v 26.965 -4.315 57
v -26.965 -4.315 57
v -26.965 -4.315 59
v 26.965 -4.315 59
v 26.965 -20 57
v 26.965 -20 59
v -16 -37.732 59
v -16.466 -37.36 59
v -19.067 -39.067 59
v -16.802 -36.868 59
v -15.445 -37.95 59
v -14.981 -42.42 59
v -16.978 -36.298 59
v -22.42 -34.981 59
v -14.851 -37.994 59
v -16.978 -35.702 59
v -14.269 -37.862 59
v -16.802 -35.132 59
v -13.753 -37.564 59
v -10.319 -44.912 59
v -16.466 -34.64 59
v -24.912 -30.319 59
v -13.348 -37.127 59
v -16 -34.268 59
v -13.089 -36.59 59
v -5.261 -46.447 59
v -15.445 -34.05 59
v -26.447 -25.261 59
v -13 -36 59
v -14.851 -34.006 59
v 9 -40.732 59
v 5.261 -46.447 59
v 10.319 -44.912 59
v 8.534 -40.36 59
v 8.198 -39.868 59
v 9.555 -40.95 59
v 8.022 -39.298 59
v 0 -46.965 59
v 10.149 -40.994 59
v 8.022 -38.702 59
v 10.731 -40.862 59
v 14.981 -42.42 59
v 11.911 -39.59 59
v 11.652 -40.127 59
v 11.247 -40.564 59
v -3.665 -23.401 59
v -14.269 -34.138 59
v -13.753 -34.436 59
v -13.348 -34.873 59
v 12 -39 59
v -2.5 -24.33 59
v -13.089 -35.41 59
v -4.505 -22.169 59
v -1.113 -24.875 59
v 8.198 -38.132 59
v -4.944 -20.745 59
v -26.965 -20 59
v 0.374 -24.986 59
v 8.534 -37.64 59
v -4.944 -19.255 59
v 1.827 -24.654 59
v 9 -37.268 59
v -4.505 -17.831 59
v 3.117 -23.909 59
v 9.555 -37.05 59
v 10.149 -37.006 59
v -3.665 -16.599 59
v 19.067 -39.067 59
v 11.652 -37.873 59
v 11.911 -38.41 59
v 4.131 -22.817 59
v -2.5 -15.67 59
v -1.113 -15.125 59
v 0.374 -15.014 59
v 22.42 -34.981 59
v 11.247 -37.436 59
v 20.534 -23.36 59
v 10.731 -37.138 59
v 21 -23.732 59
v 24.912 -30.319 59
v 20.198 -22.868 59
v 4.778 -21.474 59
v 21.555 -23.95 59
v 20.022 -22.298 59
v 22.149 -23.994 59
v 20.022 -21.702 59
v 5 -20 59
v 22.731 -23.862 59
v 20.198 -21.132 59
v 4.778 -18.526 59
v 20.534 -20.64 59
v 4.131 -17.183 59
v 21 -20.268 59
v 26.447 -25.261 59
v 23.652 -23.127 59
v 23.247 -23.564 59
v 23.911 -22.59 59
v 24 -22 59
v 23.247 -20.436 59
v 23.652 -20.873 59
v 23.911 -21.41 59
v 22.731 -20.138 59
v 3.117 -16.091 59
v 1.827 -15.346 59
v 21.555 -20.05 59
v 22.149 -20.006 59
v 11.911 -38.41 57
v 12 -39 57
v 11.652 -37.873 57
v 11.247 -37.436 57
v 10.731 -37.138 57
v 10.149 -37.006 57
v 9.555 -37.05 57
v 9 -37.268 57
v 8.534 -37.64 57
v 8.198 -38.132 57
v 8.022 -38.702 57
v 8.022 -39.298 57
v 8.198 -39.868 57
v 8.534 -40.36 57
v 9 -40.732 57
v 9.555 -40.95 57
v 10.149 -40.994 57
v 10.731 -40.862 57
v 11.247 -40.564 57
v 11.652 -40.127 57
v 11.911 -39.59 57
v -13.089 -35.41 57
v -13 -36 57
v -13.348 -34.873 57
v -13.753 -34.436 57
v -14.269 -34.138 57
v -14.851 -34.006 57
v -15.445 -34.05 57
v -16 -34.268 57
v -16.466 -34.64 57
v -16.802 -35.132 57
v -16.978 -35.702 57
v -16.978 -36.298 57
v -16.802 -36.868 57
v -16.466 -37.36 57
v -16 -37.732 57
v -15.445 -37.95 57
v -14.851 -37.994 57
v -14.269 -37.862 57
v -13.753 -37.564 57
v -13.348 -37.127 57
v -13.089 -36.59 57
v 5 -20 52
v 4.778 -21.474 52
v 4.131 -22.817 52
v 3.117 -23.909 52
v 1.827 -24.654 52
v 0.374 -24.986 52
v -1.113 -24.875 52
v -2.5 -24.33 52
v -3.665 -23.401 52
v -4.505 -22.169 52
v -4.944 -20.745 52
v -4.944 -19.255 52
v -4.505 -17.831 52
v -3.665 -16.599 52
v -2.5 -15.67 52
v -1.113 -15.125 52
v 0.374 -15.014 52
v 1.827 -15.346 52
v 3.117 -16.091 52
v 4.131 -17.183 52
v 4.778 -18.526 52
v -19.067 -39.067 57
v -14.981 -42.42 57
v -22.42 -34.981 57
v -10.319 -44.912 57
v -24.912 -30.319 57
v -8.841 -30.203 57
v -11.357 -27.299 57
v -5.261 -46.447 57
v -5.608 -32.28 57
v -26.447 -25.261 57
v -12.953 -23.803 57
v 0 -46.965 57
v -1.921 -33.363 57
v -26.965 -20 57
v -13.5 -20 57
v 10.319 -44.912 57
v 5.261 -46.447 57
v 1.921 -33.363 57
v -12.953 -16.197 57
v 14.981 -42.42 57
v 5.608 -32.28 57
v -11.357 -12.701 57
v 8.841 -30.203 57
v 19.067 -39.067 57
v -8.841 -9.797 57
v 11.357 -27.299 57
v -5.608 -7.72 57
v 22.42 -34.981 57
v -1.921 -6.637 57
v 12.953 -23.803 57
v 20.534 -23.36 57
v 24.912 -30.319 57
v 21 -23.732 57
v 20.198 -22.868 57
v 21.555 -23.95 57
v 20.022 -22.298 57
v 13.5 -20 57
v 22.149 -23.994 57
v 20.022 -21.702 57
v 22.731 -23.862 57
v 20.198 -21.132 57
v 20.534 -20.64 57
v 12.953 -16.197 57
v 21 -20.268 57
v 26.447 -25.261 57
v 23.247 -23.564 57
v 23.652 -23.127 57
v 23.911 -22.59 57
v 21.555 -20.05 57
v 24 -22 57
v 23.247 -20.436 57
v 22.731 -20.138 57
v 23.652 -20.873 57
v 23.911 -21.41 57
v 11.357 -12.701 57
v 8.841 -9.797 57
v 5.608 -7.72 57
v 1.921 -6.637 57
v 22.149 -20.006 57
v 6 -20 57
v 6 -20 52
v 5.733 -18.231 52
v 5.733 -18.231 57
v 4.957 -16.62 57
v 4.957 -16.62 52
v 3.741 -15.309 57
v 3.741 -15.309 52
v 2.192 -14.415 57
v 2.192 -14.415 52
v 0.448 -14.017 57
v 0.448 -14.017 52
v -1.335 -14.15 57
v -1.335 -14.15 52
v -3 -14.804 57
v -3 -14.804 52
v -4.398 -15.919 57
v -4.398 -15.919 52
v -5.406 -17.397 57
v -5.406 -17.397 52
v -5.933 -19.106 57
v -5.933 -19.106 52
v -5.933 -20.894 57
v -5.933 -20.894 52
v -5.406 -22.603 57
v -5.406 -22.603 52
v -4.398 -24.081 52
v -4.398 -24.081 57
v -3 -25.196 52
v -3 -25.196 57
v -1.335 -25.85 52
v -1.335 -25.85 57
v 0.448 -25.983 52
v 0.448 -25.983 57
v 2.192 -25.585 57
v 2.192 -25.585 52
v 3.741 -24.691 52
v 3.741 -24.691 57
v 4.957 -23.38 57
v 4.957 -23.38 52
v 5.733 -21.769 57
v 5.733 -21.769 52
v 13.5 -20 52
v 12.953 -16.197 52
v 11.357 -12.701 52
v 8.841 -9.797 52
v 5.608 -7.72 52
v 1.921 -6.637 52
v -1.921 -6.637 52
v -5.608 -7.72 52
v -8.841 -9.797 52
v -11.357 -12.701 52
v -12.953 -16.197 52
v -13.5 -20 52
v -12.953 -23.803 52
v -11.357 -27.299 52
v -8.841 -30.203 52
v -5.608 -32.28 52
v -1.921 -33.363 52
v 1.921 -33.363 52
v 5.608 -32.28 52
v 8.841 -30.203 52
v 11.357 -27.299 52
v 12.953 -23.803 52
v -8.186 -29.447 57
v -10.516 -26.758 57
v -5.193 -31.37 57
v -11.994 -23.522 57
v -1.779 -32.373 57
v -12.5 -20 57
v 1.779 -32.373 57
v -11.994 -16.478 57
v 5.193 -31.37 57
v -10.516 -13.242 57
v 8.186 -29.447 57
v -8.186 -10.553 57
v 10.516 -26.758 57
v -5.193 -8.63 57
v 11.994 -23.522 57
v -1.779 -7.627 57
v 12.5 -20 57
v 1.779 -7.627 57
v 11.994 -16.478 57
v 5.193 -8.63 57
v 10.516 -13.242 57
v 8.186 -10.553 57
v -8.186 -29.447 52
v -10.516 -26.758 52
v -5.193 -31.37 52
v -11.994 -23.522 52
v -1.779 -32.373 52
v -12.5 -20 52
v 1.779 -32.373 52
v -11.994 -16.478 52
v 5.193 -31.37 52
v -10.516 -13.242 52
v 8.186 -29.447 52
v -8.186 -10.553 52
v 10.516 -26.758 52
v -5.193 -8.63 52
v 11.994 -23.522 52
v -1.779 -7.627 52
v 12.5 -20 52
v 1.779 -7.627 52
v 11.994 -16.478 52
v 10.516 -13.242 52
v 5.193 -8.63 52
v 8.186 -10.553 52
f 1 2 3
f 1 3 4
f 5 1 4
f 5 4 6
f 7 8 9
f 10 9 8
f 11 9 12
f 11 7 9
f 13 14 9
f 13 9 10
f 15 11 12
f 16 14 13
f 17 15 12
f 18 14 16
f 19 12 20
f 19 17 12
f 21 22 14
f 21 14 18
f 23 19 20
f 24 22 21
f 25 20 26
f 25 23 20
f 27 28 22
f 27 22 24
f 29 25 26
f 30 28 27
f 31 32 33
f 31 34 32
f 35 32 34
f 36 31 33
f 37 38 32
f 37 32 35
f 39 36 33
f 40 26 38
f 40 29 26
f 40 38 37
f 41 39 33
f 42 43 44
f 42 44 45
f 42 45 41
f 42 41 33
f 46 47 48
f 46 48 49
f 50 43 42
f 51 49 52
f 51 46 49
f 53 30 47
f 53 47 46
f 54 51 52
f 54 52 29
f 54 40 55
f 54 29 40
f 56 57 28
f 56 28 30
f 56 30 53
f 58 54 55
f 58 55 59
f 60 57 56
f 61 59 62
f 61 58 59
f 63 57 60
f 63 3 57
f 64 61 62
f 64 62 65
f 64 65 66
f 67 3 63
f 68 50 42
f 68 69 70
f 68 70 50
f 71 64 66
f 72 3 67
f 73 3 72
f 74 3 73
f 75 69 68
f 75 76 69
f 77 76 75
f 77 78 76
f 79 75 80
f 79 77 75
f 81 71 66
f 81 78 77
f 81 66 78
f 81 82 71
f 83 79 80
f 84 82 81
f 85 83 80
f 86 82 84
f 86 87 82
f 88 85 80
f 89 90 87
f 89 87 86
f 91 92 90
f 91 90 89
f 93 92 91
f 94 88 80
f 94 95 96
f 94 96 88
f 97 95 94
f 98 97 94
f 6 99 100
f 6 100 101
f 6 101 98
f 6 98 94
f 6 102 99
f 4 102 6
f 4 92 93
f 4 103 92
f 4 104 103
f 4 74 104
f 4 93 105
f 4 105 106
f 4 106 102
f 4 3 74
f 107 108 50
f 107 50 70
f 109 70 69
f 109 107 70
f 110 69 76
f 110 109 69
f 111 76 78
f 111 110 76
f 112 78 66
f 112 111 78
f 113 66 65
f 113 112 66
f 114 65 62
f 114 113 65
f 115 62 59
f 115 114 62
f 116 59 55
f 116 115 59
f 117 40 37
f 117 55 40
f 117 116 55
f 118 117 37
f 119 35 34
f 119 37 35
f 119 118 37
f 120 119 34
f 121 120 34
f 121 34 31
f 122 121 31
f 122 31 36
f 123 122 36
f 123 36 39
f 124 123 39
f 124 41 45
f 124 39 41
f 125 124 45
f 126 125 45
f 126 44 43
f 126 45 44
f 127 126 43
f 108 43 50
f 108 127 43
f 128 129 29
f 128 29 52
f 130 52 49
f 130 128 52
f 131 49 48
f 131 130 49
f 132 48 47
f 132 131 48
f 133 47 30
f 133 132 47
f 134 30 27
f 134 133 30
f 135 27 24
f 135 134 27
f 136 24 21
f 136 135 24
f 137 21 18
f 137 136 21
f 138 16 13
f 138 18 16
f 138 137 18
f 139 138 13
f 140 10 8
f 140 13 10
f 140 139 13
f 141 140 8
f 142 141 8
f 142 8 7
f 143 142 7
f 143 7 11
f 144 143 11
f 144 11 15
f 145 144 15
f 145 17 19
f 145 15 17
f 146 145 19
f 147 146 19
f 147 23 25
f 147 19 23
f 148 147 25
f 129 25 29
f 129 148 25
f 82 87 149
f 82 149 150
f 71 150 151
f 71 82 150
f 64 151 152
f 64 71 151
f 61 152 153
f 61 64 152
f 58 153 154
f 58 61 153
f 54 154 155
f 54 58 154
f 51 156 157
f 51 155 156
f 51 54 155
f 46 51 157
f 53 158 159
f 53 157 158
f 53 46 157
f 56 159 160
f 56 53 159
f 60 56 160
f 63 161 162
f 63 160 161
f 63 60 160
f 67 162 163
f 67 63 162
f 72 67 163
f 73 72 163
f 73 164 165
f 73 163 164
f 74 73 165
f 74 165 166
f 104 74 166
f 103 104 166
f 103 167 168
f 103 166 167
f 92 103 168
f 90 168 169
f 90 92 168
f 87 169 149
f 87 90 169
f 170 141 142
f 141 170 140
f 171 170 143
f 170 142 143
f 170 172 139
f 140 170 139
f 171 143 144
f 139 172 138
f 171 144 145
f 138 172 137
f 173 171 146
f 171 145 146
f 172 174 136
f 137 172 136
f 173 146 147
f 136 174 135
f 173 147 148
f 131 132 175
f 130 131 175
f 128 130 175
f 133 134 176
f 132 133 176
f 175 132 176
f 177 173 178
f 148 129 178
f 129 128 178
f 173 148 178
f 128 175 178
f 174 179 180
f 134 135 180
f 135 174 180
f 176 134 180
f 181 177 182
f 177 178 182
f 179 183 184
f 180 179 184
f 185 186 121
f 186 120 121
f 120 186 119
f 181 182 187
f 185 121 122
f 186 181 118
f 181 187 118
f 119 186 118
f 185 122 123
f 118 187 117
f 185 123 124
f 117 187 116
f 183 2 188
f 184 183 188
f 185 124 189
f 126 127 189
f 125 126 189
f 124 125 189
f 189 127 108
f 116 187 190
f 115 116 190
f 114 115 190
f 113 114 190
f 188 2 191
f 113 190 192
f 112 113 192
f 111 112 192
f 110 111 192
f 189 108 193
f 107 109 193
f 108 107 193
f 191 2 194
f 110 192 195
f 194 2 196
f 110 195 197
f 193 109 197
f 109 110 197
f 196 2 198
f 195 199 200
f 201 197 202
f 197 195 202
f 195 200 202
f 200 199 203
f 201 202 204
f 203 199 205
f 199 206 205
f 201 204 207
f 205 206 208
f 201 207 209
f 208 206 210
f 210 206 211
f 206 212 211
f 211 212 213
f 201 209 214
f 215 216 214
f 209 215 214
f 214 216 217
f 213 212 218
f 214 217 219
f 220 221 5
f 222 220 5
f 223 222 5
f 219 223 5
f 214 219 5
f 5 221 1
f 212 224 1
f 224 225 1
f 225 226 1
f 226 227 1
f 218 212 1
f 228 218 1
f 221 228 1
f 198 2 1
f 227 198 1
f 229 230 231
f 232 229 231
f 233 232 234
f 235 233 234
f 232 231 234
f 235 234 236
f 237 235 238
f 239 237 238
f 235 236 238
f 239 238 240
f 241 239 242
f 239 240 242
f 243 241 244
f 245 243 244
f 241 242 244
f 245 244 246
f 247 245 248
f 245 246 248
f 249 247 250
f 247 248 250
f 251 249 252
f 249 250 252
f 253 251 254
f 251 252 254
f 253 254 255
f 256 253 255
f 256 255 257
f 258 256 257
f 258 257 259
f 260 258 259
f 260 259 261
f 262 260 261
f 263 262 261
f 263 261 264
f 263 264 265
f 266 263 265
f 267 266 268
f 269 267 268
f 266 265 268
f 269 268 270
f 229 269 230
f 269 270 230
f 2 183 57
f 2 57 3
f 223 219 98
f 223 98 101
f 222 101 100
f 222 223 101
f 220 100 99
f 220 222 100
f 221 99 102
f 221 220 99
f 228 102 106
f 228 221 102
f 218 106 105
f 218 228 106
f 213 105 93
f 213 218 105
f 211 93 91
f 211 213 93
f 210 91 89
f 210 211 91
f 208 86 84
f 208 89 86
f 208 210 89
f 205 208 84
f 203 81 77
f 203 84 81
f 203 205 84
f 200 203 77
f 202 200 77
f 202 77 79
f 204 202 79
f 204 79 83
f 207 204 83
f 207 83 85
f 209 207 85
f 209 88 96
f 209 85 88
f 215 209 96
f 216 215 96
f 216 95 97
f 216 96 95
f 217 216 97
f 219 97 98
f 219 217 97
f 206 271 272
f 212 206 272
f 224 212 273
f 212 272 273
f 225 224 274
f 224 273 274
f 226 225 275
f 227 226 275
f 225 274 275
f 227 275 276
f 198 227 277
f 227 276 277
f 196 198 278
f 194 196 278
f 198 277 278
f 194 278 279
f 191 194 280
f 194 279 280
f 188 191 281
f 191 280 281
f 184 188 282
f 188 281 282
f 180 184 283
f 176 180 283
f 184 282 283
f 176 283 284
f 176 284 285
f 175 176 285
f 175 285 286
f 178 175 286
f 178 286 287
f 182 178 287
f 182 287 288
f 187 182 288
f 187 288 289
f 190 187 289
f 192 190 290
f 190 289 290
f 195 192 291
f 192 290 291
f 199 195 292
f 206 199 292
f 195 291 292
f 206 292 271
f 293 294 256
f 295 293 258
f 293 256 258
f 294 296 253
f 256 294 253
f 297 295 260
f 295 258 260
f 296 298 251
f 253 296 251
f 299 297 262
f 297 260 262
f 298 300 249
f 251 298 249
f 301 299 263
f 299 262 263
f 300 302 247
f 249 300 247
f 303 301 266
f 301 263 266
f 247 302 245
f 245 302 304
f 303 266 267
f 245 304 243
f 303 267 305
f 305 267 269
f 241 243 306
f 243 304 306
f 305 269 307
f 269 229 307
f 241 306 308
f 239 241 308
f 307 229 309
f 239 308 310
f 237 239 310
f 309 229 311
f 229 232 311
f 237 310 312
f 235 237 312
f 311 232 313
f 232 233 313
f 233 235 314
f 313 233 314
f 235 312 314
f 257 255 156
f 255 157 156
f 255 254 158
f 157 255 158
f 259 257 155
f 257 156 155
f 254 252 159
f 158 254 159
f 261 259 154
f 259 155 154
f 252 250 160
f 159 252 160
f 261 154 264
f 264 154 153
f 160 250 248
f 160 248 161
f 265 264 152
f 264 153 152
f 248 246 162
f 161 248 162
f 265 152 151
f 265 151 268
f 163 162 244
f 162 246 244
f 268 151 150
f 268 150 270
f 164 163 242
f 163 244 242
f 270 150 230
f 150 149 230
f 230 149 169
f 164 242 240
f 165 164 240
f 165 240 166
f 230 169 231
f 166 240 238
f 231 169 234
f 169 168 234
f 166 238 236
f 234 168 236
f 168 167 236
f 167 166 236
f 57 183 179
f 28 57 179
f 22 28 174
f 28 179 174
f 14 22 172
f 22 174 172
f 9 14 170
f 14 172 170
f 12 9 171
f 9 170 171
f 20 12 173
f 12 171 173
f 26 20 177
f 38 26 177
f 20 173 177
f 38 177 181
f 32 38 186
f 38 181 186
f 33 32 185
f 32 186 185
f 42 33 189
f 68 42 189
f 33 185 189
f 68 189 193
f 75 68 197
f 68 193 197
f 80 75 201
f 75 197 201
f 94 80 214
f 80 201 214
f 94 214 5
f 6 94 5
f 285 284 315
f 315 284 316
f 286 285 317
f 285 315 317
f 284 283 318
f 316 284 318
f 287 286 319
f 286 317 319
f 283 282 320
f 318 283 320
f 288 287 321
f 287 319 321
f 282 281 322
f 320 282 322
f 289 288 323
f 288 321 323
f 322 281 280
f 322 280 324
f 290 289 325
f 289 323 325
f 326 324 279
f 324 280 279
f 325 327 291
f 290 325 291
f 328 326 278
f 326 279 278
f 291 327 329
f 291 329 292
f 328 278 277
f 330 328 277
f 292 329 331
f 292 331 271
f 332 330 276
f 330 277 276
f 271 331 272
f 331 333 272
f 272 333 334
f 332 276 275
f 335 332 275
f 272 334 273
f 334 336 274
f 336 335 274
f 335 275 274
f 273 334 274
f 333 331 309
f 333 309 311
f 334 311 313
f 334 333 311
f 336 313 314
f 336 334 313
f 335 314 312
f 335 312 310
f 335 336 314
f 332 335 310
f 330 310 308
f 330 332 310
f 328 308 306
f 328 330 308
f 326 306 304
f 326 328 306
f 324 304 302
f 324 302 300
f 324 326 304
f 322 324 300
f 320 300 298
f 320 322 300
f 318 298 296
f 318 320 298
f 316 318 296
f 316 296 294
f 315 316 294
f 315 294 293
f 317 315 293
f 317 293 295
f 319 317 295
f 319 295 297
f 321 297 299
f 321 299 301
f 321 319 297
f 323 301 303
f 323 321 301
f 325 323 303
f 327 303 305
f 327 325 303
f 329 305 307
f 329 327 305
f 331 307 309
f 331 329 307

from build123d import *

# Parameters (mm, degrees)
CYLINDER003_R     = 5
CYLINDER003_DEPTH = 10
CYLINDER001_R     = 2
CYLINDER001_DEPTH = 10
CYLINDER002_R     = 2
CYLINDER002_DEPTH = 10
CYLINDER_R        = 2
CYLINDER_DEPTH    = 10
EXTRUDE005_DEPTH  = 2
SKETCH003_R       = 13.5
SKETCH003_R_2     = 12.5
SKETCH003_R_3     = 6
SKETCH003_R_4     = 5
EXTRUDE003_DEPTH  = 5


with BuildPart() as cylinder003:
    # Cylinder003 → Cylinder003 (new body)
    with BuildSketch(Plane(origin=(0, -20, 62), x_dir=(1, 0, 0), z_dir=(0, 0, -1))):
        Circle(CYLINDER003_R)
    extrude(amount=CYLINDER003_DEPTH)


with BuildPart() as cylinder001:
    # Cylinder001 → Cylinder001 (new body)
    with BuildSketch(Plane(origin=(10, -39, 55), x_dir=(1, 0, 0), z_dir=(0, 0, 1))):
        Circle(CYLINDER001_R)
    extrude(amount=CYLINDER001_DEPTH)


with BuildPart() as cylinder002:
    # Cylinder002 → Cylinder002 (new body)
    with BuildSketch(Plane(origin=(-15, -36, 54), x_dir=(1, 0, 0), z_dir=(0, 0, 1))):
        Circle(CYLINDER002_R)
    extrude(amount=CYLINDER002_DEPTH)


with BuildPart() as cylinder:
    # Cylinder → Cylinder (new body)
    with BuildSketch(Plane(origin=(22, -22, 54), x_dir=(1, 0, 0), z_dir=(0, 0, 1))):
        Circle(CYLINDER_R)
    extrude(amount=CYLINDER_DEPTH)


with BuildPart() as extrude005:
    # Sketch004 (on Face4 of Extrude003) → Extrude005 (new body)
    with BuildSketch(Plane.XY.offset(57)):
        with BuildLine():
            ThreePointArc((-26.964716, -20), (0, -46.964716), (26.964716, -20))
            Line((26.964716, -4.315231), (26.964716, -20))
            Line((-26.964716, -4.315231), (26.964716, -4.315231))
            Line((-26.964716, -20), (-26.964716, -4.315231))
        make_face()
    extrude(amount=EXTRUDE005_DEPTH)


with BuildPart() as cut003:
    # Sketch003 → Extrude003 (new body)
    with BuildSketch(Plane.XY.offset(52)):
        with Locations((0, -20)):
            Circle(SKETCH003_R)
        with Locations((0, -20)):
            Circle(SKETCH003_R_2, mode=Mode.SUBTRACT)
        with Locations((0, -20)):
            Circle(SKETCH003_R_3)
        with Locations((0, -20)):
            Circle(SKETCH003_R_4, mode=Mode.SUBTRACT)
    extrude(amount=EXTRUDE003_DEPTH)

    # Fusion: union Extrude005
    add(extrude005.part)

    # Cut: cut Cylinder
    add(cylinder.part, mode=Mode.SUBTRACT)

    # Cut001: cut Cylinder002
    add(cylinder002.part, mode=Mode.SUBTRACT)

    # Cut002: cut Cylinder001
    add(cylinder001.part, mode=Mode.SUBTRACT)

    # Cut003: cut Cylinder003
    add(cylinder003.part, mode=Mode.SUBTRACT)


solid = cut003.part
